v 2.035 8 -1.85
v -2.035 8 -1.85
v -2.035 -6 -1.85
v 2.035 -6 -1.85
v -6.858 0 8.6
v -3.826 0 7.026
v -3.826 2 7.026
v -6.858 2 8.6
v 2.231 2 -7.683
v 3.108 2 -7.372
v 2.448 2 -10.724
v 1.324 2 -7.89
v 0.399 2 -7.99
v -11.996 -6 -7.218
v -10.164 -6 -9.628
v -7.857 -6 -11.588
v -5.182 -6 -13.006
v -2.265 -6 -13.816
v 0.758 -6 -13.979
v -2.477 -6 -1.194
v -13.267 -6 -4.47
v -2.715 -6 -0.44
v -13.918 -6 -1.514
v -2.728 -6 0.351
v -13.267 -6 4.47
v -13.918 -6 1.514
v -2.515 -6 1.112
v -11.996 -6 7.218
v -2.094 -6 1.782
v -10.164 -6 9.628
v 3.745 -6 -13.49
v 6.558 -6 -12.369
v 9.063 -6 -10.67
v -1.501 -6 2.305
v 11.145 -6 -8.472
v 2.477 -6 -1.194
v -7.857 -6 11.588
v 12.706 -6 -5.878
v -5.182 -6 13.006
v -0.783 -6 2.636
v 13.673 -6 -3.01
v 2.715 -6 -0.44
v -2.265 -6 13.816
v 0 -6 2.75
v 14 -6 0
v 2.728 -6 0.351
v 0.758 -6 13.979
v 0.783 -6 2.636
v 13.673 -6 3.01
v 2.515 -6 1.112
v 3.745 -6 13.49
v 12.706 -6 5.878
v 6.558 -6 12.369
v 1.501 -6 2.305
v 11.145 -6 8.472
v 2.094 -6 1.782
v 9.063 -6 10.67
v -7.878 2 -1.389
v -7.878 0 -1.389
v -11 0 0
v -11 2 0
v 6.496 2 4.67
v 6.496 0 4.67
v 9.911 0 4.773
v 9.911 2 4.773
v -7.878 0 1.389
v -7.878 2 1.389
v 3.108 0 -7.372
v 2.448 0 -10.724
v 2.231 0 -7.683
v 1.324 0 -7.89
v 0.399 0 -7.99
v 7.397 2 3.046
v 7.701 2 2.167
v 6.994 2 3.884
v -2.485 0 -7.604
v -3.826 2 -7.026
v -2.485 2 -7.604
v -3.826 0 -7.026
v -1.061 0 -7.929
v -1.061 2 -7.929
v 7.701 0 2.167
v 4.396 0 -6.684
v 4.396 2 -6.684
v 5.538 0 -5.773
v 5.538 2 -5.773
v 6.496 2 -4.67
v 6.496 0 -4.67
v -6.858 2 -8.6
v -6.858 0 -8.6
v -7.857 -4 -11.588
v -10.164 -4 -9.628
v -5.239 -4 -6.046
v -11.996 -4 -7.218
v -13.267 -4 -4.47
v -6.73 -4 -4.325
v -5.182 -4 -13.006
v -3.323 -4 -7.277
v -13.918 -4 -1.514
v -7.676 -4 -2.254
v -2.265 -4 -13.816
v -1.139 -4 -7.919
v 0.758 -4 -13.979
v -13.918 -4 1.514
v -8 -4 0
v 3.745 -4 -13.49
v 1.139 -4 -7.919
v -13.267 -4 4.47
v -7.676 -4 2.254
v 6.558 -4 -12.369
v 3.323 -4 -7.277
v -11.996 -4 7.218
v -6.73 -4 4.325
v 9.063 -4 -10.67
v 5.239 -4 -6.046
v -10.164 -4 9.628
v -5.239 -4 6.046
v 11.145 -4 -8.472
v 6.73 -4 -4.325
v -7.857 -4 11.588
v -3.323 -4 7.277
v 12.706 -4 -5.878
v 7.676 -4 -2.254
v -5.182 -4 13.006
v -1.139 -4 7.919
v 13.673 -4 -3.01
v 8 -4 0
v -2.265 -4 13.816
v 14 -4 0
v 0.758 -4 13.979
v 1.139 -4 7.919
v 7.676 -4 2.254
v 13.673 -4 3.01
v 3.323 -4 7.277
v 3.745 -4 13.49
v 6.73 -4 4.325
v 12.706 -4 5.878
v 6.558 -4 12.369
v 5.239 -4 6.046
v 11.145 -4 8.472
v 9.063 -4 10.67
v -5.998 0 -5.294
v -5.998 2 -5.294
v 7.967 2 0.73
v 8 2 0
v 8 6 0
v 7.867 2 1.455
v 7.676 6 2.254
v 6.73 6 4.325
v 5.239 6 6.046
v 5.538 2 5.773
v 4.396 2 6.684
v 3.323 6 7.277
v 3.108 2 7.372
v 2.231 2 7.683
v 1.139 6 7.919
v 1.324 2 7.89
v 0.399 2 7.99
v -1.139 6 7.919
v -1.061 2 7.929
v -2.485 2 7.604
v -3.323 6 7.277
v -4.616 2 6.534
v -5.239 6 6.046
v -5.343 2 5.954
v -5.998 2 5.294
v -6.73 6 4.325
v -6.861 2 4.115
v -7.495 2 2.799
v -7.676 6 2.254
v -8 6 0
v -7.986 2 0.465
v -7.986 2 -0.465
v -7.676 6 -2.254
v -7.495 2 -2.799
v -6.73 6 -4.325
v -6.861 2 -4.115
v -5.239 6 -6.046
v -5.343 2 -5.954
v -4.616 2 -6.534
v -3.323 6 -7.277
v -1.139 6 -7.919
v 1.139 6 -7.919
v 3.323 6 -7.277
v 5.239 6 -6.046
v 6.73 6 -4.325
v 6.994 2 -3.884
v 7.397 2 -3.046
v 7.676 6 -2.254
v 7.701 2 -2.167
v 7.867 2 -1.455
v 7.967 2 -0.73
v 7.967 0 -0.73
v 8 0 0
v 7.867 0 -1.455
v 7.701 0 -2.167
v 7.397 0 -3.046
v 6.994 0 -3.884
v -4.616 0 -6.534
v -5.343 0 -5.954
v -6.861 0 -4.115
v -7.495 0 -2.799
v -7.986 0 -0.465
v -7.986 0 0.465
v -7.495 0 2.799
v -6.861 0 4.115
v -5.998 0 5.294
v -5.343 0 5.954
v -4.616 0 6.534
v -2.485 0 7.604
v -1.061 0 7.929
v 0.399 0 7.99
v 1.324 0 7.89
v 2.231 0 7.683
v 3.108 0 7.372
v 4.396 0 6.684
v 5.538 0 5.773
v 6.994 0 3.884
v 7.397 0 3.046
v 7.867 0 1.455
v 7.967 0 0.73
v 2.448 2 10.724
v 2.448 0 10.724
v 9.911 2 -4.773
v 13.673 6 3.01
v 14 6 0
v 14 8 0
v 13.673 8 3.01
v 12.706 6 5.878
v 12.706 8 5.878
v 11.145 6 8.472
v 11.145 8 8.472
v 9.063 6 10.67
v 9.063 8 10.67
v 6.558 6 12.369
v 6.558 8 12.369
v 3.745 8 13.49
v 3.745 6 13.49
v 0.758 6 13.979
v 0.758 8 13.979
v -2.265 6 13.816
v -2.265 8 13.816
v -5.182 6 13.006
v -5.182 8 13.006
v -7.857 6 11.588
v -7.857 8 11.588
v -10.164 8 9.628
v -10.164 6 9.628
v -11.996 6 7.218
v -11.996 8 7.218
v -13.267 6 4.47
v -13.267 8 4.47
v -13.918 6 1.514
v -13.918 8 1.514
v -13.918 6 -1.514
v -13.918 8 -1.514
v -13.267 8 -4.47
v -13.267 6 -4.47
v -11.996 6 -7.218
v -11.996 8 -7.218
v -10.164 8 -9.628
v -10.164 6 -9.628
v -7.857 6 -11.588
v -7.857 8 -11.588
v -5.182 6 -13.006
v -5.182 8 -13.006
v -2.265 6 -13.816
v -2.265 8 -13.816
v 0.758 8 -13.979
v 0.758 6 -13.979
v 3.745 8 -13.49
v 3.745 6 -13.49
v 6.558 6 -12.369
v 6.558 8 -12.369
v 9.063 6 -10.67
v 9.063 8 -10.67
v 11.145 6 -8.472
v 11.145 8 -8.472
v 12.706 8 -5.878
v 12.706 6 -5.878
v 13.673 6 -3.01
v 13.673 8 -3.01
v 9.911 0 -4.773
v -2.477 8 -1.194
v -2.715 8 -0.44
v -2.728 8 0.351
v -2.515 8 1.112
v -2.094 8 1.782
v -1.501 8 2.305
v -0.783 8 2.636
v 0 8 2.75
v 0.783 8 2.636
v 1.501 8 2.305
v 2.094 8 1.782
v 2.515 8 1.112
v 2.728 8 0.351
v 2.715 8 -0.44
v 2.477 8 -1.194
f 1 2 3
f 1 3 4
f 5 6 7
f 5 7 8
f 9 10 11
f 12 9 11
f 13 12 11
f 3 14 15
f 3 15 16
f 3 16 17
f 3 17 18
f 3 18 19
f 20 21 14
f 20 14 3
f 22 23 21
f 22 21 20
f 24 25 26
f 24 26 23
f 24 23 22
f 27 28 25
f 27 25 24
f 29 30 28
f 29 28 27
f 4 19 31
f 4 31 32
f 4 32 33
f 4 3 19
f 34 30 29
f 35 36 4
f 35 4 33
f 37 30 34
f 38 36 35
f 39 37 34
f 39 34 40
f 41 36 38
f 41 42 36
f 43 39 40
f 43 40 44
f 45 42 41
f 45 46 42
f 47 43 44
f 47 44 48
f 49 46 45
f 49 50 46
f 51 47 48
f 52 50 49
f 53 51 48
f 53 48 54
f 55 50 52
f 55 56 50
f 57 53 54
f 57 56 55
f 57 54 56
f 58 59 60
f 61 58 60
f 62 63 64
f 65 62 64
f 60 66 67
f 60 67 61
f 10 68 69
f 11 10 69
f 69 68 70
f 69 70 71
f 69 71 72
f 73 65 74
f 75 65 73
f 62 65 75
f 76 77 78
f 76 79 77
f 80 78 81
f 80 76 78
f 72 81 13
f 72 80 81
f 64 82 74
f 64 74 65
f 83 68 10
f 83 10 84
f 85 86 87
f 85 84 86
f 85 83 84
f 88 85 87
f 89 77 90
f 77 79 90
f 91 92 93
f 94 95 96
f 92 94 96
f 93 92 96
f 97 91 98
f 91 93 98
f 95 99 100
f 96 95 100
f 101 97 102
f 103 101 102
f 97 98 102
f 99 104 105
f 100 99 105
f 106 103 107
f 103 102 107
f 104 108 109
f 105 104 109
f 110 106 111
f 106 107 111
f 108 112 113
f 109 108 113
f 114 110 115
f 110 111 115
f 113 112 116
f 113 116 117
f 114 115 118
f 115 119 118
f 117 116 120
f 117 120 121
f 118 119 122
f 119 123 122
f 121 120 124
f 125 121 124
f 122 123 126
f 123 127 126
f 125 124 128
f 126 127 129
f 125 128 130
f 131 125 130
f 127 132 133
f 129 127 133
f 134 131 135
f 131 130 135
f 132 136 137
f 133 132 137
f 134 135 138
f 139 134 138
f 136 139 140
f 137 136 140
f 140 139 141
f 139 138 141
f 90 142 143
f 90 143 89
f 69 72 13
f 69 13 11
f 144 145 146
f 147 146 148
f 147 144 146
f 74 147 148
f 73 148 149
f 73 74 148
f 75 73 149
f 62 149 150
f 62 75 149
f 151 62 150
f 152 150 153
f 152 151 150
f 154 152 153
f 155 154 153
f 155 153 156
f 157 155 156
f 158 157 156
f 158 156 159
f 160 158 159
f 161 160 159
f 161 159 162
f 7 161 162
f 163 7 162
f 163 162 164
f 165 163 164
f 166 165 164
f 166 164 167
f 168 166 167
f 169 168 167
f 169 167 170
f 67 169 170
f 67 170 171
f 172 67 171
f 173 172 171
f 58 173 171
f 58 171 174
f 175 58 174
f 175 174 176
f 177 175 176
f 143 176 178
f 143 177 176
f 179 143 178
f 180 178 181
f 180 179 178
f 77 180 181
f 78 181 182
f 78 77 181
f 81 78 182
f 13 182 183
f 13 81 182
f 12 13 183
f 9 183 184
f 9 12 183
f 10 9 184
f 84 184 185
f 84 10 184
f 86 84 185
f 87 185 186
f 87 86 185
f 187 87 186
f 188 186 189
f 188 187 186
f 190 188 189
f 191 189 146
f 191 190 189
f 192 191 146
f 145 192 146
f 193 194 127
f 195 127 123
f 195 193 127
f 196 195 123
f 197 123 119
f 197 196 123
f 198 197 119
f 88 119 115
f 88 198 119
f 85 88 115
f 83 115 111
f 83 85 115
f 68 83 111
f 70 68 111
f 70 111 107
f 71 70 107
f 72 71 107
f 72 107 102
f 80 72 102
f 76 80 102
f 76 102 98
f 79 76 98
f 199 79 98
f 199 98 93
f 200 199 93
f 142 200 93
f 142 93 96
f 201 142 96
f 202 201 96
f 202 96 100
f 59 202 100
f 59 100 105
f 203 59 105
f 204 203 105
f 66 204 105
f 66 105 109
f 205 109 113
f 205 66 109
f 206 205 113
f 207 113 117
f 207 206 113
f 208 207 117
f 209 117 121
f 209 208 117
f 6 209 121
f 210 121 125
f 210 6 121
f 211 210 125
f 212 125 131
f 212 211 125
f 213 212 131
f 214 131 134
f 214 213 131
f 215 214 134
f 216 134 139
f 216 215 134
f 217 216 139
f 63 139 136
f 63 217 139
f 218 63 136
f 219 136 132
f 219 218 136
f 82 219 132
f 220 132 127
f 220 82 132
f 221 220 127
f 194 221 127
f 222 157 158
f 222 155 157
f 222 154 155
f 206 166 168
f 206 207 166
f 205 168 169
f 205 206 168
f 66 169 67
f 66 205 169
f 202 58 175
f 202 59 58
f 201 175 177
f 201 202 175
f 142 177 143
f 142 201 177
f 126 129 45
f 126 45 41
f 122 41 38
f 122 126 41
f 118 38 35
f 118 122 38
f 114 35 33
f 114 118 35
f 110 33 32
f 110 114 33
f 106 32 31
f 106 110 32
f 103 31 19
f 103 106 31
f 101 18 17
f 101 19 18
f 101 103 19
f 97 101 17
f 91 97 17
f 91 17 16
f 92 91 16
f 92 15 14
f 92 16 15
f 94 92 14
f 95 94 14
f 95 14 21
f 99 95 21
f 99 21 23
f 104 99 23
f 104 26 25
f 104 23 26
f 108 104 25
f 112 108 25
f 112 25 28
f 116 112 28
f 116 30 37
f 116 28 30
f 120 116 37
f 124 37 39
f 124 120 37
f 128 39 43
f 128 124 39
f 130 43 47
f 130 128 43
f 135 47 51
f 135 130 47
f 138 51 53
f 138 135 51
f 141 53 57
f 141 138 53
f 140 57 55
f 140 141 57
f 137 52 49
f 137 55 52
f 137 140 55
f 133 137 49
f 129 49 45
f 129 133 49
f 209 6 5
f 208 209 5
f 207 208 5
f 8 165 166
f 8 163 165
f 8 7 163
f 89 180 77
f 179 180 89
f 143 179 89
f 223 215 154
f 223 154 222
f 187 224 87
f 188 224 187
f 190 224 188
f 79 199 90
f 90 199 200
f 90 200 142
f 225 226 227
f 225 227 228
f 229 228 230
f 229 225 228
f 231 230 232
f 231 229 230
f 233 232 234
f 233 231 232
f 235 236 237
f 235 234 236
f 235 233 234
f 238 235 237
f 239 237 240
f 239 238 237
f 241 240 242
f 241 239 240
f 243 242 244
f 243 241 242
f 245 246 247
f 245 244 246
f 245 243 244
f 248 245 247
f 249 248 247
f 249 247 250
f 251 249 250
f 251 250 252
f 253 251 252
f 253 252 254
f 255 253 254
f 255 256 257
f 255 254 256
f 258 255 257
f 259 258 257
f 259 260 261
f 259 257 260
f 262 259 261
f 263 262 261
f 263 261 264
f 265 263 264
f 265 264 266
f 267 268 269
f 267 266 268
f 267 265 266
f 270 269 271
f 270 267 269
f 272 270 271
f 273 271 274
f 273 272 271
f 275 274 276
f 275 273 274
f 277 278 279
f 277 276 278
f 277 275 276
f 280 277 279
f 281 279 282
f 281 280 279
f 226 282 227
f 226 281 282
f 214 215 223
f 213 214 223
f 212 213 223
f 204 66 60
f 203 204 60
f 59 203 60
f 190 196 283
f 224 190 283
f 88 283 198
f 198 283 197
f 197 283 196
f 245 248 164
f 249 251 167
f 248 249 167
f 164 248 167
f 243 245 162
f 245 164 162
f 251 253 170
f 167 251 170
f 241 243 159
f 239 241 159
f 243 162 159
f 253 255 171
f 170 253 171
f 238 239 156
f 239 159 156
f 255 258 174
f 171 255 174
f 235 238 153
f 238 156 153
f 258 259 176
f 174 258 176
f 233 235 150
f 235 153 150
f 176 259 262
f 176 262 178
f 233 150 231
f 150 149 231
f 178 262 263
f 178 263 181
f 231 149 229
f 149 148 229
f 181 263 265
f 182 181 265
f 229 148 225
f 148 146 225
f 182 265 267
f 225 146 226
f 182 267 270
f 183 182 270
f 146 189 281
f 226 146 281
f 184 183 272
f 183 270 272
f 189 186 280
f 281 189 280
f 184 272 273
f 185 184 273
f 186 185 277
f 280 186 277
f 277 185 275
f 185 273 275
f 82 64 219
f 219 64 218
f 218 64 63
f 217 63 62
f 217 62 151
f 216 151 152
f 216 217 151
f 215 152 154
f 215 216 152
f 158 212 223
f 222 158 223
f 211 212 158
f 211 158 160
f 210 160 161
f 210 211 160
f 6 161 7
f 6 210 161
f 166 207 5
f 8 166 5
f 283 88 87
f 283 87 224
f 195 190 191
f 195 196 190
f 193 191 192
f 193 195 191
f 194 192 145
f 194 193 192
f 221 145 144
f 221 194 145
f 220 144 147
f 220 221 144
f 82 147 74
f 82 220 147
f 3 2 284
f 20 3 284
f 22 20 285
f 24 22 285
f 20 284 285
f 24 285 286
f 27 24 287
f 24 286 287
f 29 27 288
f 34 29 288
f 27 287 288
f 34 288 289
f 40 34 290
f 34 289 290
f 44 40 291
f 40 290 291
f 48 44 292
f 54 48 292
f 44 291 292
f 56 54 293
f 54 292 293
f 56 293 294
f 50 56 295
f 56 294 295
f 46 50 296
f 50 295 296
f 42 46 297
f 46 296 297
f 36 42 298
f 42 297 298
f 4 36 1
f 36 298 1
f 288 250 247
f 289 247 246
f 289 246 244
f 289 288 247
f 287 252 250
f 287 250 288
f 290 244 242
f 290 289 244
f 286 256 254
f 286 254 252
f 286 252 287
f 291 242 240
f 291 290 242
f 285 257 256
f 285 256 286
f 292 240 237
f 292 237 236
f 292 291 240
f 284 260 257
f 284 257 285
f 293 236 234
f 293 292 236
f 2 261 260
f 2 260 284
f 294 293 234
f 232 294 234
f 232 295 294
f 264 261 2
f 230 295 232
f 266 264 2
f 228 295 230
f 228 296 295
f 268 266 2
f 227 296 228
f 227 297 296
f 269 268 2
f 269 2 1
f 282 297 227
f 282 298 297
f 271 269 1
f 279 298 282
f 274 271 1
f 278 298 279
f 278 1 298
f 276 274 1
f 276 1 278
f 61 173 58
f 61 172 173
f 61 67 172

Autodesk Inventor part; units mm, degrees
ref_plane "YZ Plane" through (0, 0, 0) normal (1, 0, 0) x (0, 1, 0)
ref_plane "XZ Plane" through (0, 0, 0) normal (0, 1, 0) x (-1, 0, 0)
ref_plane "XY Plane" through (0, 0, 0) normal (0, 0, 1) x (1, 0, 0)
sketch "Sketch1" plane through (0, 0, 0) normal (0, 1, 0) x (-1, 0, 0)
  line L0 (0, 0) -> (13.4559, 0) construction
  line L1 (7.8785, 1.3892) -> (11, 0)
  line L2 (7.8785, -1.3892) -> (11, 0)
  line L3 (5.9982, 5.2935) -> (6.8584, 8.6001)
  line L4 (3.826, 7.0258) -> (6.8584, 8.6001)
  line L5 (-0.3988, 7.9901) -> (-2.4477, 10.7242)
  line L6 (-3.1075, 7.3718) -> (-2.4477, 10.7242)
  line L7 (-6.4955, 4.6699) -> (-9.9107, 4.7727)
  line L8 (-7.701, 2.1667) -> (-9.9107, 4.7727)
  line L9 (-7.701, -2.1667) -> (-9.9107, -4.7727)
  line L10 (-6.4955, -4.6699) -> (-9.9107, -4.7727)
  line L11 (-3.1075, -7.3718) -> (-2.4477, -10.7242)
  line L12 (-0.3988, -7.9901) -> (-2.4477, -10.7242)
  line L13 (3.826, -7.0258) -> (6.8584, -8.6001)
  line L14 (5.9982, -5.2935) -> (6.8584, -8.6001)
  arc A0 (7.8785, 1.3892) -> (5.9982, 5.2935) centre (0, 0) ccw
  arc A1 (5.9982, -5.2935) -> (7.8785, -1.3892) centre (0, 0) ccw
  arc A2 (-0.3988, -7.9901) -> (3.826, -7.0258) centre (0, 0) ccw
  arc A3 (-6.4955, -4.6699) -> (-3.1075, -7.3718) centre (0, 0) ccw
  arc A4 (-7.701, 2.1667) -> (-7.701, -2.1667) centre (0, 0) ccw
  arc A5 (3.826, 7.0258) -> (-0.3988, 7.9901) centre (0, 0) ccw
  arc A6 (-3.1075, 7.3718) -> (-6.4955, 4.6699) centre (0, 0) ccw
  dimension "d10" = 360
extrude "Extrusion1" add sketch "Sketch1" along normal blind 2
sketch "Sketch2" plane through (0, 2, 0) normal (0, 1, 0) x (1, 0, 0)
  circle A0 centre (0, 0) radius 8
extrude "Extrusion2" add sketch "Sketch2" along normal blind 4
sketch "Sketch3" plane through (0, 0, 0) normal (0, -1, 0) x (1, 0, 0)
  circle A0 centre (0, 0) radius 8
extrude "Extrusion3" add sketch "Sketch3" along normal blind 4
sketch "Sketch4" plane through (0, 6, 0) normal (0, 1, 0) x (1, 0, 0)
  circle A0 centre (0, 0) radius 14
  dimension "d18" = 28
sketch "Sketch5" plane through (0, -4, 0) normal (0, -1, 0) x (1, 0, 0)
  circle A0 centre (0, 0) radius 14
  dimension "d19" = 28
extrude "Extrusion4" add sketch "Sketch5" along normal blind 2
extrude "Extrusion5" add sketch "Sketch4" along normal blind 2
sketch "Sketch6" plane through (0, 8, 0) normal (0, 1, 0) x (1, 0, 0)
  arc A0 (-2.0347, 1.85) -> (2.0347, 1.85) centre (0, 0) ccw
  line L0 (-2.0347, 1.85) -> (2.0347, 1.85)
  dimension "d24" = 5.5
extrude "Extrusion6" cut sketch "Sketch6" against normal through all
